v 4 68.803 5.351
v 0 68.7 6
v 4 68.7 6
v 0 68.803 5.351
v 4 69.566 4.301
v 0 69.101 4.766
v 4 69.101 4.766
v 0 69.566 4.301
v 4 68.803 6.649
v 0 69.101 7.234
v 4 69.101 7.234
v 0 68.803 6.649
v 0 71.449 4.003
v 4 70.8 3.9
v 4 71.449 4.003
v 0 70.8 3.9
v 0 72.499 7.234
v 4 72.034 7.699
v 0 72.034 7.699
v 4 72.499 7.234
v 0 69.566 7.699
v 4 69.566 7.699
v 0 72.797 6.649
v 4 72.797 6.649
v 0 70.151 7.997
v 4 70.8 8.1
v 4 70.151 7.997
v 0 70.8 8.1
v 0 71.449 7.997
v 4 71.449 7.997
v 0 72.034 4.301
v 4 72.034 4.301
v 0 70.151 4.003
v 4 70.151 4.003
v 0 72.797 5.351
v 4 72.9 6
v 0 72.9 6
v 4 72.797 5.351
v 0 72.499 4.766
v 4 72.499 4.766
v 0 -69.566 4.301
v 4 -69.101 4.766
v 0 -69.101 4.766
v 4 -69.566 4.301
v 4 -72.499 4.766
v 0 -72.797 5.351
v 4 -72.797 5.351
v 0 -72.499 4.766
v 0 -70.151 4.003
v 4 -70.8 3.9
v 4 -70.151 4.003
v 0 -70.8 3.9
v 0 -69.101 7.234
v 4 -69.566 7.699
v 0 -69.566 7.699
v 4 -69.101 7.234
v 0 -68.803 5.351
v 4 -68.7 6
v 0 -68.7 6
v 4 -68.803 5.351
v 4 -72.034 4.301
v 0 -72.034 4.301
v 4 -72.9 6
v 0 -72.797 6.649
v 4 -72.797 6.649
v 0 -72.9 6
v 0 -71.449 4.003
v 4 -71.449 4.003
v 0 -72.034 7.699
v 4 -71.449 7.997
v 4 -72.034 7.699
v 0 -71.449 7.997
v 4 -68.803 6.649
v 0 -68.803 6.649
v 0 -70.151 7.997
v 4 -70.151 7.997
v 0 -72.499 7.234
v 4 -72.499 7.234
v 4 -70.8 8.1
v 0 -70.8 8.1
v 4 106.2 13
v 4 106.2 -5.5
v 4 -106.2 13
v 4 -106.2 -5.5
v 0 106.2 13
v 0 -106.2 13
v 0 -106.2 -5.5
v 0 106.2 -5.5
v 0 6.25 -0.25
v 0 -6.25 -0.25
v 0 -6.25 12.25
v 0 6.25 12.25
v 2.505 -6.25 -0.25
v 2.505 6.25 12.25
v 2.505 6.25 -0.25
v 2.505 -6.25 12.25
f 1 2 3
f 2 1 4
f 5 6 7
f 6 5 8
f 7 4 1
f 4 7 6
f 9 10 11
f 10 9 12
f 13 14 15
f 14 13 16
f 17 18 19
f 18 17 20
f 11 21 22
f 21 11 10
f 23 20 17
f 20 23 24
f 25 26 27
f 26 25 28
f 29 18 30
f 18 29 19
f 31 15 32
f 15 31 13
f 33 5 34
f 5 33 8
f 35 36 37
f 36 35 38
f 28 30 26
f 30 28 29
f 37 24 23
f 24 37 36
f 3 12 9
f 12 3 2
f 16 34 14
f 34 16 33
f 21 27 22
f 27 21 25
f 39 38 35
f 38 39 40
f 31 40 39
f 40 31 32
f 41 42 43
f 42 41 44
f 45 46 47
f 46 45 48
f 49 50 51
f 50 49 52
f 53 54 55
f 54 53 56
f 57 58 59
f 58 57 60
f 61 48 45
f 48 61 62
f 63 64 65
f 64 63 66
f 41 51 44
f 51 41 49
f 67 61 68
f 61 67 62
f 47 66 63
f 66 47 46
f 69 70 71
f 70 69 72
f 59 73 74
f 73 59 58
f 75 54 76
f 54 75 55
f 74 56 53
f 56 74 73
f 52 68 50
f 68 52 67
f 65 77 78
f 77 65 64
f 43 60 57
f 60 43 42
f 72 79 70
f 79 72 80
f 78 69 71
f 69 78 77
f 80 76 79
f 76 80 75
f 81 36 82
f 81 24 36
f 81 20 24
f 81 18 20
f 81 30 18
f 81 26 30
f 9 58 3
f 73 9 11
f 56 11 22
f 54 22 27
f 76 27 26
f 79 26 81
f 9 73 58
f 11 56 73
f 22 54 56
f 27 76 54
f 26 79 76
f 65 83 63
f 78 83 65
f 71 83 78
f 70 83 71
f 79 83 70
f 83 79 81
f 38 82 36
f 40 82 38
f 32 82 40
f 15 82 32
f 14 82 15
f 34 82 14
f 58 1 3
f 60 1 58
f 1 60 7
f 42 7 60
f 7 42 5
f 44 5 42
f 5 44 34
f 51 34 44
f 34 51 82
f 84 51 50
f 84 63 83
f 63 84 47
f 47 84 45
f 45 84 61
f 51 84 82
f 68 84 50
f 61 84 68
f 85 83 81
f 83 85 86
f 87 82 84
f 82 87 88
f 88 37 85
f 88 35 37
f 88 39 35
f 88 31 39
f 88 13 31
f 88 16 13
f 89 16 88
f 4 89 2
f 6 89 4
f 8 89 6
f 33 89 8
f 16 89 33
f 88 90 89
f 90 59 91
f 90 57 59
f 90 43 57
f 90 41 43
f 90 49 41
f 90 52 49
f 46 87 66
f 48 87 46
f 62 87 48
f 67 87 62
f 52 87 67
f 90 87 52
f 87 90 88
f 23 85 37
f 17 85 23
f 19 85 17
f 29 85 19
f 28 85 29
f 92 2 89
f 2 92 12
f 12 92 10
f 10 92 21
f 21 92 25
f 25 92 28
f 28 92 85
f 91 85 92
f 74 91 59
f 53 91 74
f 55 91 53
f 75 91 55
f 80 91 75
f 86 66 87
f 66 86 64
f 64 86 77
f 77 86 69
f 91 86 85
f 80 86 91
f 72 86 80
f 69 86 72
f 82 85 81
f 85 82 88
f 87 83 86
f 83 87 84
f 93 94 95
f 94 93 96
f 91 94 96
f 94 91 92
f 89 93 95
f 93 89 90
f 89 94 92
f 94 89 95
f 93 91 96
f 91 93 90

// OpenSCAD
// Endplate for Modular 7-Segment Display (v2 Design)
// Caps off the right side of a panel when you want to end the chain early.

// --- Key Parameters ---
endplate_thick = 4.0;   // Thickness of the endplate

pitch = 83;             // Center-to-center distance between parallel LED strips (83 mm)
strip_width = 12;       // Width of LED strip (12 mm)
white_wall = 1.2;       // Thickness of the white inner reflector walls
margin_y = 15;          // Extra bezel space on top and bottom sides

tunnel_depth = 12;      // Depth of the light tunnel
diffuser_thick = 1.0;   // Thickness of the white top diffuser layer
connector_thick = 4.0;  
backplate_floor = 1.5;  
backplate_thick = connector_thick + backplate_floor; // 6.0 mm total backplate thickness

// --- Calculated Dimensions ---
diffuser_w = strip_width + 2;      
total_seg_w = diffuser_w + white_wall * 2; 

digit_height = pitch * 2 + total_seg_w + margin_y * 2; // 231.4 mm
total_depth = tunnel_depth + diffuser_thick;           // 13 mm

// --- Endplate Component ---
module endplate() {
    difference() {
        // Main block (covers both frontplate and backplate side profile)
        // We orient it so the mating face is at X=0, and it extends to X = endplate_thick
        translate([endplate_thick/2, 0, (total_depth - backplate_thick)/2])
            cube([endplate_thick, digit_height, total_depth + backplate_thick], center=true);
            
        // Female receiver pocket for the 12x12 alignment protrusion
        // The protrusion sticks out 2mm, so we cut 2.5mm deep
        translate([2.5/2, 0, tunnel_depth/2]) 
            cube([2.51, 12.5, 12.5], center=true);
            
        // Holes for heat-set inserts (4.2mm diameter) to receive screws from the panel
        for (y = [digit_height/3, -digit_height/3]) {
            translate([0, y, tunnel_depth/2]) 
                rotate([0, 90, 0]) 
                cylinder(h=20, r=2.1, center=true, $fn=20);
        }
    }
}

// --- Render ---
color("DimGray") endplate();
